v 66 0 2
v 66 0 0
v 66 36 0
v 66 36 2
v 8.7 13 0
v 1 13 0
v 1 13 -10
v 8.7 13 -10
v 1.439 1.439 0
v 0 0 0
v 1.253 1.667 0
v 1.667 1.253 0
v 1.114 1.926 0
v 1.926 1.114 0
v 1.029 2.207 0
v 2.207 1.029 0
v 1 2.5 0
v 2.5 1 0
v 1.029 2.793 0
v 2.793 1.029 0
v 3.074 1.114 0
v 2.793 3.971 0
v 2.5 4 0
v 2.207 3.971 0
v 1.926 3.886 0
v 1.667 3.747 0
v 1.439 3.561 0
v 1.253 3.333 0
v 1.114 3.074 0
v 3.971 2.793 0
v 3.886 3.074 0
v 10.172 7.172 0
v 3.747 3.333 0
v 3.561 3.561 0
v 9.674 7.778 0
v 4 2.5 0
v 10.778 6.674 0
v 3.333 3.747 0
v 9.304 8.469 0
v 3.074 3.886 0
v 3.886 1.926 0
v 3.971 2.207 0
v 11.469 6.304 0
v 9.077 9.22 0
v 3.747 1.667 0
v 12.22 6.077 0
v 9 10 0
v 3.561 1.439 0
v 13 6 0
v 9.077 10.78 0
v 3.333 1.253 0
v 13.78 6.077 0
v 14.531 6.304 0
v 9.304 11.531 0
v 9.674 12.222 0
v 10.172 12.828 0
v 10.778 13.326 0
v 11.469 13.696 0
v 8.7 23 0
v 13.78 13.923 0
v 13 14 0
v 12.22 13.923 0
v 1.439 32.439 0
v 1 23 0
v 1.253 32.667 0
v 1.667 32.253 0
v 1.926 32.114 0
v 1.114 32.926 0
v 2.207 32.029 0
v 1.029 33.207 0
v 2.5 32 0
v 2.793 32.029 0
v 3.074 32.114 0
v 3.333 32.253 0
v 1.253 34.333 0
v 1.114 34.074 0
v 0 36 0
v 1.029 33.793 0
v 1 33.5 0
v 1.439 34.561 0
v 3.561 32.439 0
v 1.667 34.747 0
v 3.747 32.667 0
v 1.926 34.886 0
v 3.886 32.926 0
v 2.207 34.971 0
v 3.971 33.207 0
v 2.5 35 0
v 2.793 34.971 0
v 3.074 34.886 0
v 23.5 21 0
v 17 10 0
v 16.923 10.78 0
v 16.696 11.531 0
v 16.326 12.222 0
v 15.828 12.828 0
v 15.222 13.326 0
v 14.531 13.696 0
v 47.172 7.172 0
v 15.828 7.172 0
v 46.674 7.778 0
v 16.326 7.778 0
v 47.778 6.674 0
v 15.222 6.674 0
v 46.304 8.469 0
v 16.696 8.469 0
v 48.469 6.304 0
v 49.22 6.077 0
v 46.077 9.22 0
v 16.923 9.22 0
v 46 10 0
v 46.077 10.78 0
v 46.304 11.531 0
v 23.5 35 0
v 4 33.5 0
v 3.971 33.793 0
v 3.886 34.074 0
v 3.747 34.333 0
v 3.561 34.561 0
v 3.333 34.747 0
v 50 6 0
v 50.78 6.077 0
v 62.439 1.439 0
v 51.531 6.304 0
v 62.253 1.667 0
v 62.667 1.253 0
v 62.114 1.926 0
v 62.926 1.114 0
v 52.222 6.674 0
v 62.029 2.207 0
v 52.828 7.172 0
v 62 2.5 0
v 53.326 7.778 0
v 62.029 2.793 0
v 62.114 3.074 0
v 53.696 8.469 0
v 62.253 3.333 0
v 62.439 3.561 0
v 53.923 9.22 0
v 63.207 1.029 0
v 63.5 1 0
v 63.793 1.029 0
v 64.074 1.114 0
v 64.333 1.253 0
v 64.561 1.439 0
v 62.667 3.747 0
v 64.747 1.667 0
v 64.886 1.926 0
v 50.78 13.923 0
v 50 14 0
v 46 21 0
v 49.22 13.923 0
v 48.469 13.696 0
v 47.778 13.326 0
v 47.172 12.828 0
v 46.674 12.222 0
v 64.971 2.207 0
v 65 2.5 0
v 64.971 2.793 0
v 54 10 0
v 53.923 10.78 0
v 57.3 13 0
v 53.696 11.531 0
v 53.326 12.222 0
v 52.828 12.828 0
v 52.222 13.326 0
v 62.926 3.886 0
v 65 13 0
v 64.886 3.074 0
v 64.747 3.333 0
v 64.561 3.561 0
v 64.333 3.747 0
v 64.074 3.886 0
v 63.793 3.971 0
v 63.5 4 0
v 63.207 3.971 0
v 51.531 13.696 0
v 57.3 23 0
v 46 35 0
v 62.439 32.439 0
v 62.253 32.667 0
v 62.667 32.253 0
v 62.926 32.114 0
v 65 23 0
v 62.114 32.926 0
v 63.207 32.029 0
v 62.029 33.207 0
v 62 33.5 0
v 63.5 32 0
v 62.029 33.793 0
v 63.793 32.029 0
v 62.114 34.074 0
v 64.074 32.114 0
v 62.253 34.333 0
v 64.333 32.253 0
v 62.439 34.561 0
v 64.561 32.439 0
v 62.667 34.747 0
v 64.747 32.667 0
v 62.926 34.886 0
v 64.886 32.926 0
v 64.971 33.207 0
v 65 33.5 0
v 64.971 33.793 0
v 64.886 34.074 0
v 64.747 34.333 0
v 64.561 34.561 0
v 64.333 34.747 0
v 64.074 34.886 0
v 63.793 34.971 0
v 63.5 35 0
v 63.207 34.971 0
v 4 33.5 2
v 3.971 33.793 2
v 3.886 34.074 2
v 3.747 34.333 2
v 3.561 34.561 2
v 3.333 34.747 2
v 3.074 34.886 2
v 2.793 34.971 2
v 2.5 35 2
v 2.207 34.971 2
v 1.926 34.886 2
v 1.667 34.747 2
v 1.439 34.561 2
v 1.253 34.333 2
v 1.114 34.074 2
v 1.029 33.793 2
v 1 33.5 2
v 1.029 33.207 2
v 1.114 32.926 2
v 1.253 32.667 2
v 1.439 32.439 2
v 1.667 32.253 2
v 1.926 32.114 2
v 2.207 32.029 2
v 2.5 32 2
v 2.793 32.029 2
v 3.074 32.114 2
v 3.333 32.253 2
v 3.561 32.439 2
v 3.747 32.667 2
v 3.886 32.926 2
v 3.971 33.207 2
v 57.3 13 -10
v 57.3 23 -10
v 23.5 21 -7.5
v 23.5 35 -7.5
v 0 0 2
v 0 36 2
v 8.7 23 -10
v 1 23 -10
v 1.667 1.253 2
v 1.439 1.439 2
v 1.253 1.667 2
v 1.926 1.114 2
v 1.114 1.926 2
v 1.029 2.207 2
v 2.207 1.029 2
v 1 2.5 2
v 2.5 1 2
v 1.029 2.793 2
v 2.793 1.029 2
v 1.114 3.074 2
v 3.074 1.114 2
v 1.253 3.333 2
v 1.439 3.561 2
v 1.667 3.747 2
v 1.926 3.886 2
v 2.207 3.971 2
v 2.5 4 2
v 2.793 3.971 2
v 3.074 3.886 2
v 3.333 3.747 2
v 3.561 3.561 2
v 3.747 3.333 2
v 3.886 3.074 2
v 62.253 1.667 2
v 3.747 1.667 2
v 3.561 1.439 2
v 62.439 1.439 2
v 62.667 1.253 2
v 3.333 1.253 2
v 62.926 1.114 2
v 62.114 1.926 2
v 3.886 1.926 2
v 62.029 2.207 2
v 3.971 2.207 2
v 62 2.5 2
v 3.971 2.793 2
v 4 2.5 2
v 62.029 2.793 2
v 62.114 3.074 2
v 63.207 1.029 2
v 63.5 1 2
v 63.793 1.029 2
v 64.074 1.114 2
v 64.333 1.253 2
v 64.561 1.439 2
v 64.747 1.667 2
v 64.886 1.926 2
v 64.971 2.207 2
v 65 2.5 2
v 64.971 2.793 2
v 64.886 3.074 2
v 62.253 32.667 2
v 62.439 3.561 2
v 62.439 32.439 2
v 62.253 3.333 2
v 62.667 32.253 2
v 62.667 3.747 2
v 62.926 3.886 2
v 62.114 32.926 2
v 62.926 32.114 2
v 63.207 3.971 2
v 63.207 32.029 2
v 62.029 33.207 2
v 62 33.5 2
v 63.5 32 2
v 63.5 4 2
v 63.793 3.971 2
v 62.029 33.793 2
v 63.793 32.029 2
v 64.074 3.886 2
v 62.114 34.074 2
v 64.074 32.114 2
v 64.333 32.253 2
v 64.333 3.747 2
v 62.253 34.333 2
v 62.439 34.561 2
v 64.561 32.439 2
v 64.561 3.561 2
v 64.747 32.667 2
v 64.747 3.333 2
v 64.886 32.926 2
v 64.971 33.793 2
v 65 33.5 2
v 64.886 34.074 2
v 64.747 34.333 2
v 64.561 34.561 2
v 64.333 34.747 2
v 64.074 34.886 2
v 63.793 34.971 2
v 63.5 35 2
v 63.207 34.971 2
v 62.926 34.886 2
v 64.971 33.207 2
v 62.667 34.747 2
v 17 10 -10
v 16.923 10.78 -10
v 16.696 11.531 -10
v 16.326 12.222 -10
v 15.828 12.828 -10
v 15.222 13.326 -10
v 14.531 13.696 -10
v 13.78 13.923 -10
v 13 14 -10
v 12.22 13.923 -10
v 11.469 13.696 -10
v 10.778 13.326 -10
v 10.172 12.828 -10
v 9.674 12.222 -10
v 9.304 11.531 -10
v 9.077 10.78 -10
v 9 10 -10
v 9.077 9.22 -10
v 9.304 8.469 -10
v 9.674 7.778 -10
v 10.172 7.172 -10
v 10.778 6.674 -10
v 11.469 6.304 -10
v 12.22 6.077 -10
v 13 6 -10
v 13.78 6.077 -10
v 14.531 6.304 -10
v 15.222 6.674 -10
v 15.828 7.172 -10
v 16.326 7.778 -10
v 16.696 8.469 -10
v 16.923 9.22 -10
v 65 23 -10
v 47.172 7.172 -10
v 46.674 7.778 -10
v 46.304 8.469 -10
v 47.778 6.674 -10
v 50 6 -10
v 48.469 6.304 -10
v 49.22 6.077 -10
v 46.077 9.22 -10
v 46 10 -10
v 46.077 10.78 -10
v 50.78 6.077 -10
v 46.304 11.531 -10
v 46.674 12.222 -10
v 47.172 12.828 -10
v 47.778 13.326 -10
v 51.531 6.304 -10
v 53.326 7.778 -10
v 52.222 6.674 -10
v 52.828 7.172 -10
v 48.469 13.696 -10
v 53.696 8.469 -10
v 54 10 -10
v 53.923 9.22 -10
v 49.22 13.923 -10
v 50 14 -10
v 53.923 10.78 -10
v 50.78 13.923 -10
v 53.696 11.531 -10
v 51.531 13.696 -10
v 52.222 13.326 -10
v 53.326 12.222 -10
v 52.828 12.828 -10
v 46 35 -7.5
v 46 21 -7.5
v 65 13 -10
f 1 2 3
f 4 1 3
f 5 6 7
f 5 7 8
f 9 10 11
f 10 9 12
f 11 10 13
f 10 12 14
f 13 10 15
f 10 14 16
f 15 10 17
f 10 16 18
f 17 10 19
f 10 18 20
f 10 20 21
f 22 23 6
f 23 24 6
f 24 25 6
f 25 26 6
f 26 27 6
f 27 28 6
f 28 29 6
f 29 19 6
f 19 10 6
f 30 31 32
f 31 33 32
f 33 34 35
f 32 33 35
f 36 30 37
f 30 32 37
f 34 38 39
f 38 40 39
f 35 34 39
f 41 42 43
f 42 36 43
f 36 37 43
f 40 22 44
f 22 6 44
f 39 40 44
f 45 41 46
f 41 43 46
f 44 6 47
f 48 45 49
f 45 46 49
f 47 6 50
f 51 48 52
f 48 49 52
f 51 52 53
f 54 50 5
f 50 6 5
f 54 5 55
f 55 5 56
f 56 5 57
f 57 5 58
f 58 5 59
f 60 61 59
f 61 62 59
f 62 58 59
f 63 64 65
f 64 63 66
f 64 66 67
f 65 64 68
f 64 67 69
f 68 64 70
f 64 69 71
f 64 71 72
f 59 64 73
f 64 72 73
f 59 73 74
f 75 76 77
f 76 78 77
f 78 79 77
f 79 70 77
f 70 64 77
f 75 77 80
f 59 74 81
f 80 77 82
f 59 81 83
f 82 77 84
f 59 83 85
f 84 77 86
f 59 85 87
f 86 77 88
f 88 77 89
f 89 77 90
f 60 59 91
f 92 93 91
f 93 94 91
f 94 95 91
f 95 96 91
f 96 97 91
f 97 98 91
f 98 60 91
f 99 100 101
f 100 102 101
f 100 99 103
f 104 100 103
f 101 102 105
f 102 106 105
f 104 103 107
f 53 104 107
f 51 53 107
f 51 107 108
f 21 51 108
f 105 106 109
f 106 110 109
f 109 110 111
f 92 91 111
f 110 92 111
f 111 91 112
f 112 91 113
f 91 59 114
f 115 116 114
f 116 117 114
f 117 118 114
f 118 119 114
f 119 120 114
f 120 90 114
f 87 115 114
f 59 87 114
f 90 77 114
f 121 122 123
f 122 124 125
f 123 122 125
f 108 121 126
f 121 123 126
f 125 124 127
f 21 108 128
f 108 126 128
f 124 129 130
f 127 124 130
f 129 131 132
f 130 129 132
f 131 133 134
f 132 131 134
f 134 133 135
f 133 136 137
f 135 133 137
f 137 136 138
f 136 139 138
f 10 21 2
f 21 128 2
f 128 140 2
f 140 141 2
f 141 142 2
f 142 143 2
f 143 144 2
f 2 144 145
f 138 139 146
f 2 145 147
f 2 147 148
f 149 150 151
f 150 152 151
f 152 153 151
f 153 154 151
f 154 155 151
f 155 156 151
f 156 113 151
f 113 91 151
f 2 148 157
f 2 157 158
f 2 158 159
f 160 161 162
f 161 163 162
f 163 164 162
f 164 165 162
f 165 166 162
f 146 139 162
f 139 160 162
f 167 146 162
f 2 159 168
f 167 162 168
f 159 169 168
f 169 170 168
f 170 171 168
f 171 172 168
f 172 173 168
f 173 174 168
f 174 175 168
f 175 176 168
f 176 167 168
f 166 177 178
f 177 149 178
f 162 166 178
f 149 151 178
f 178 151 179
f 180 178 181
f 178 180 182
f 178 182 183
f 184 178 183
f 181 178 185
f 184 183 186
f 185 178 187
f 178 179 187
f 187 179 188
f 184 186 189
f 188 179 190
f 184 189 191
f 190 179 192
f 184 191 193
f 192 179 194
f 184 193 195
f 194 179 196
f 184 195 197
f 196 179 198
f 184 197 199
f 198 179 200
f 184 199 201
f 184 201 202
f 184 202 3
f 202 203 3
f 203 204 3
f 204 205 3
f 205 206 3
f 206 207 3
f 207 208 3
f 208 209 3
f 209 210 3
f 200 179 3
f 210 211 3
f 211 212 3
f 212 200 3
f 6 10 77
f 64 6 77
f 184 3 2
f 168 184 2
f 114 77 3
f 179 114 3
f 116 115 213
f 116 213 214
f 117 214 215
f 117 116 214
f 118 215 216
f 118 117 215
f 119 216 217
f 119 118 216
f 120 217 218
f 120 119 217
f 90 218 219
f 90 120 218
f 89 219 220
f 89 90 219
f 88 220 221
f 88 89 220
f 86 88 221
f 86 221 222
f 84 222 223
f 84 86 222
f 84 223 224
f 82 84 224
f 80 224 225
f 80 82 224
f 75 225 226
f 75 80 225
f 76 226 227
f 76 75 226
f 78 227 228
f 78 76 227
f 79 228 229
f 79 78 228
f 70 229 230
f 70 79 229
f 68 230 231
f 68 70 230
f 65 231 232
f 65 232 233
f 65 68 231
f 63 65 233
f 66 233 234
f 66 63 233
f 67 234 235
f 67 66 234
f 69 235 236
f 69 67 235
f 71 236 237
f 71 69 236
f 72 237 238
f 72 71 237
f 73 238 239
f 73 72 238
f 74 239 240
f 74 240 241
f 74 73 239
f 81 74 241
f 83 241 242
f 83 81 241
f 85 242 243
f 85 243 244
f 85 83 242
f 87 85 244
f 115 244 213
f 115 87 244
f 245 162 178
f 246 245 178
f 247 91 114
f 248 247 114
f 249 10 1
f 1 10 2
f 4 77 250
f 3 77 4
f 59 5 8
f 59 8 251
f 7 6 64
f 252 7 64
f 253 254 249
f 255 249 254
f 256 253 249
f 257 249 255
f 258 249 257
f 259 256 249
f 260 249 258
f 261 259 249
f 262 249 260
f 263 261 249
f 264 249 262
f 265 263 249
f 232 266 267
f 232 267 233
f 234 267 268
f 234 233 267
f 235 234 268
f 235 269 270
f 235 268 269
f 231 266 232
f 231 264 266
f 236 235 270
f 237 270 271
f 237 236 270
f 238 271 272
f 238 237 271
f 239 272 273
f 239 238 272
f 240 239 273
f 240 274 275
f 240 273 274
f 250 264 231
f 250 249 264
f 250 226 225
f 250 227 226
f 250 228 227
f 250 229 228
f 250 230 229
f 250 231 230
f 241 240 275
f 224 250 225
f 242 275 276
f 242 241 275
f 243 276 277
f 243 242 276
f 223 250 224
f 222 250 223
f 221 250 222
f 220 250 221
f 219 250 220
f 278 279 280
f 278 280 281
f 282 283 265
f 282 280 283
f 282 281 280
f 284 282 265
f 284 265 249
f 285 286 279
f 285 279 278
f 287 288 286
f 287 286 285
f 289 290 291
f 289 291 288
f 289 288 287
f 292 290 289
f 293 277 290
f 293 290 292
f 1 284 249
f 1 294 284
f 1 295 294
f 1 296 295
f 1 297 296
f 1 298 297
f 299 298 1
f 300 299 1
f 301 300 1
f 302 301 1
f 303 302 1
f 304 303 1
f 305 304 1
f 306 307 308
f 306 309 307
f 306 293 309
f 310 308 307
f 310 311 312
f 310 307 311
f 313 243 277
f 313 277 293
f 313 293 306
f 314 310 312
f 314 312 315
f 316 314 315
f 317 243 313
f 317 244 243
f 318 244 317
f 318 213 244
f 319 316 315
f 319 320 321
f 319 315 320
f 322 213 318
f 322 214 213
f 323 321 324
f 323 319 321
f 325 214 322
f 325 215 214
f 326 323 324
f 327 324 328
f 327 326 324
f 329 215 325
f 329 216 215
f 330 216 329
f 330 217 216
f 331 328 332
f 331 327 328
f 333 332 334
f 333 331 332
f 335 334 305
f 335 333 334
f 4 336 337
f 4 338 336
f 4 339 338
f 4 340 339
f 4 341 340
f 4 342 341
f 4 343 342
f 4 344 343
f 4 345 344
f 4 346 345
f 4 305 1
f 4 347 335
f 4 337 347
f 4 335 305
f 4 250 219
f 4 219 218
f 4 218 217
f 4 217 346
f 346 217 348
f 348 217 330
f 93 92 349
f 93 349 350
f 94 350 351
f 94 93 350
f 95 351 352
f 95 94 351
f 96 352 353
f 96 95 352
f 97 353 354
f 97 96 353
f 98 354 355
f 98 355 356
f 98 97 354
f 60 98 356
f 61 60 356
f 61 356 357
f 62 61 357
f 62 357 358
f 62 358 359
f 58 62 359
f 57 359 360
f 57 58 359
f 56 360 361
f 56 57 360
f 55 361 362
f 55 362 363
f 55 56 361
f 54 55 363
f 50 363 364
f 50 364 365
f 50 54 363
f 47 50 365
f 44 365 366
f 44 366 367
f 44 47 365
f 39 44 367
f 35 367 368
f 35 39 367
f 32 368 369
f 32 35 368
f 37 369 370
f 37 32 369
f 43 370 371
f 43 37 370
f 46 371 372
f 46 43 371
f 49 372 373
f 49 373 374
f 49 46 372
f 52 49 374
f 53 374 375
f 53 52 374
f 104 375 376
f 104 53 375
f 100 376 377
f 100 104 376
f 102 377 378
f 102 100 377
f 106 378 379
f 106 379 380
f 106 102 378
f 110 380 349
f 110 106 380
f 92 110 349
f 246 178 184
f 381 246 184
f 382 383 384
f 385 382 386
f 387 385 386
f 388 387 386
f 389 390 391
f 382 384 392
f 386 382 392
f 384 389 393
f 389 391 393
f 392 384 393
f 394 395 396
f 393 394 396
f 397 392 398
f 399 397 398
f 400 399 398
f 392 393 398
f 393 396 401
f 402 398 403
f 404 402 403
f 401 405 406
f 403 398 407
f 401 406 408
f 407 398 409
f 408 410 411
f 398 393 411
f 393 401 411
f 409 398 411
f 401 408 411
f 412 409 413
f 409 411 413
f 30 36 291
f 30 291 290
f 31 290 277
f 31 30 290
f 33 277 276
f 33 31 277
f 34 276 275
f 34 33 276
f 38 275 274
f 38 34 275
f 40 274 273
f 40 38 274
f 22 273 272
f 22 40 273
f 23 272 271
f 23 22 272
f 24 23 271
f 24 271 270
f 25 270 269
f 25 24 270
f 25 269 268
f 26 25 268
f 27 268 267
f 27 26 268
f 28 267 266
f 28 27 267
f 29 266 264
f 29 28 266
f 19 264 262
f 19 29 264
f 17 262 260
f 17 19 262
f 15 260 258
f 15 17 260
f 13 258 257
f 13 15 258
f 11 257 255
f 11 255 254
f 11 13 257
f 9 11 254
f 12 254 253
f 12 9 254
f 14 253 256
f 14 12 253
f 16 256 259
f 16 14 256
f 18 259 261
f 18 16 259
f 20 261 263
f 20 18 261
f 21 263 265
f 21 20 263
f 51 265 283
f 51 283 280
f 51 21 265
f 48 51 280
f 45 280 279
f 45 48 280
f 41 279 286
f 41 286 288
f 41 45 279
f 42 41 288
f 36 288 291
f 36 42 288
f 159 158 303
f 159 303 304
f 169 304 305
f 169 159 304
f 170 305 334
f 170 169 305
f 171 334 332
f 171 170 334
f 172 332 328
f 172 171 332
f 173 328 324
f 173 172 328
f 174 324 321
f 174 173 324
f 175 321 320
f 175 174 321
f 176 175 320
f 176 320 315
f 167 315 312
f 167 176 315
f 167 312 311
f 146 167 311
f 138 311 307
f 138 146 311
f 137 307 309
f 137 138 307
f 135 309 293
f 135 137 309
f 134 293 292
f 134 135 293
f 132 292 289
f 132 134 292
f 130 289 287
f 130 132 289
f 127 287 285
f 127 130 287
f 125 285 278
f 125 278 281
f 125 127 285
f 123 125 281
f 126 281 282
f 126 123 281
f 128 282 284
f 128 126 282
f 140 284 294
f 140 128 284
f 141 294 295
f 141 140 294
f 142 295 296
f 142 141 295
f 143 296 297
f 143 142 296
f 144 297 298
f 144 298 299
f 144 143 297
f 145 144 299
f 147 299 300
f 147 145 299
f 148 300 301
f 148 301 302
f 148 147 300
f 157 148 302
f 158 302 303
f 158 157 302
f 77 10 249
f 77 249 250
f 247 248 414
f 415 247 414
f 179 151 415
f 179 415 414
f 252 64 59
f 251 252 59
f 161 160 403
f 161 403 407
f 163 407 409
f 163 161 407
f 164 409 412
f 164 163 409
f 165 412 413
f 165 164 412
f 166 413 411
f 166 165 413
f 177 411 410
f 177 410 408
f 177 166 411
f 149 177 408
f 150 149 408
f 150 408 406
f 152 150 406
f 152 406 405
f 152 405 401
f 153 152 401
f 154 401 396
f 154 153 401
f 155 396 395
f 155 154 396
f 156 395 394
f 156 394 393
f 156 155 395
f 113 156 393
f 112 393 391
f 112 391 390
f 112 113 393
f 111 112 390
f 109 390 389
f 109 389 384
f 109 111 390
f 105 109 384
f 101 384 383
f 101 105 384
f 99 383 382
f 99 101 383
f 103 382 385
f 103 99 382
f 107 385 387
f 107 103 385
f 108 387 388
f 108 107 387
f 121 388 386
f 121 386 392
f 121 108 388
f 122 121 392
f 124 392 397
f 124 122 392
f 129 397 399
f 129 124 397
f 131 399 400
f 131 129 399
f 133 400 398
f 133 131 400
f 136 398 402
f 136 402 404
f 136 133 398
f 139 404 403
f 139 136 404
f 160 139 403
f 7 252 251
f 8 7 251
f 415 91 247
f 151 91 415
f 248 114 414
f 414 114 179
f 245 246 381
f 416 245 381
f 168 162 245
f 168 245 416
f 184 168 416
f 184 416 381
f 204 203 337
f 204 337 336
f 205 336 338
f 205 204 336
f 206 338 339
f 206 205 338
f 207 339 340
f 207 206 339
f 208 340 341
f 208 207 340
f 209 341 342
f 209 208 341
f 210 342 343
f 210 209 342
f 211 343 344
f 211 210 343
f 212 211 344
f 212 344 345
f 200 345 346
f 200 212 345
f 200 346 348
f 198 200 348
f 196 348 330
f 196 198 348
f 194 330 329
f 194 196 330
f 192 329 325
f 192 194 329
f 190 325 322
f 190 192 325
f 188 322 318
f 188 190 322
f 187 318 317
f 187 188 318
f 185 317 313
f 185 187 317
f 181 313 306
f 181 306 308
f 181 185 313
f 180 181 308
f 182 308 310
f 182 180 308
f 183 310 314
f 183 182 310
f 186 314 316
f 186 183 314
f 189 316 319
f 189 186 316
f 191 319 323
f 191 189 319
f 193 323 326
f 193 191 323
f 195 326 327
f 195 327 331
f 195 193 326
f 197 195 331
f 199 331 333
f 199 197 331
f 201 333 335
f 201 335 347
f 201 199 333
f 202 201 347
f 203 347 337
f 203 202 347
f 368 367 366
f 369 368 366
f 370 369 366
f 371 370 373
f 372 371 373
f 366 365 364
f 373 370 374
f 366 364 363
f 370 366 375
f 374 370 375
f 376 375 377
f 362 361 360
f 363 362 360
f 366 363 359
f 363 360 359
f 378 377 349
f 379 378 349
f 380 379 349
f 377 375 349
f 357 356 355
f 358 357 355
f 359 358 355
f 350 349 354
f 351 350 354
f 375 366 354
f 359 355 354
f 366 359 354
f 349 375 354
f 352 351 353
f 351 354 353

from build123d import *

# Parameters (mm, degrees)
SKETCH1_W           = 66
SKETCH1_H           = 36
SKETCH1_R           = 1.5
BOSS_EXTRUDE1_DEPTH = 2
SKETCH1_3_W         = 7.7
SKETCH1_3_H         = 10
BOSS_EXTRUDE2_DEPTH = 10
SKETCH1_4_W         = 22.5
SKETCH1_4_H         = 14
BOSS_EXTRUDE3_DEPTH = 7.5
SKETCH1_6_R         = 4
BOSS_EXTRUDE4_DEPTH = 10


with BuildPart() as part:
    # Sketch1 → Boss-Extrude1 (new body)
    with BuildSketch(Plane.XY):
        with Locations((33, 18)):
            Rectangle(SKETCH1_W, SKETCH1_H)
        with Locations((2.5, 2.5)):
            Circle(SKETCH1_R, mode=Mode.SUBTRACT)
        with Locations((63.5, 2.5)):
            Circle(SKETCH1_R, mode=Mode.SUBTRACT)
        with Locations((2.5, 33.5)):
            Circle(SKETCH1_R, mode=Mode.SUBTRACT)
        with Locations((63.5, 33.5)):
            Circle(SKETCH1_R, mode=Mode.SUBTRACT)
    extrude(amount=BOSS_EXTRUDE1_DEPTH)

    # Sketch1<3> → Boss-Extrude2 (add)
    with BuildSketch(Plane.XY):
        with Locations((61.15, 18)):
            Rectangle(SKETCH1_3_W, SKETCH1_3_H)
        with Locations((4.85, 18)):
            Rectangle(SKETCH1_3_W, SKETCH1_3_H)
    extrude(amount=-BOSS_EXTRUDE2_DEPTH)

    # Sketch1<4> → Boss-Extrude3 (add)
    with BuildSketch(Plane.XY):
        with Locations((34.75, 28)):
            Rectangle(SKETCH1_4_W, SKETCH1_4_H)
    extrude(amount=-BOSS_EXTRUDE3_DEPTH)

    # Sketch1<6> → Boss-Extrude4 (add)
    with BuildSketch(Plane.XY):
        with Locations((50, 10)):
            Circle(SKETCH1_6_R)
        with Locations((13, 10)):
            Circle(SKETCH1_6_R)
    extrude(amount=-BOSS_EXTRUDE4_DEPTH)


solid = part.part
